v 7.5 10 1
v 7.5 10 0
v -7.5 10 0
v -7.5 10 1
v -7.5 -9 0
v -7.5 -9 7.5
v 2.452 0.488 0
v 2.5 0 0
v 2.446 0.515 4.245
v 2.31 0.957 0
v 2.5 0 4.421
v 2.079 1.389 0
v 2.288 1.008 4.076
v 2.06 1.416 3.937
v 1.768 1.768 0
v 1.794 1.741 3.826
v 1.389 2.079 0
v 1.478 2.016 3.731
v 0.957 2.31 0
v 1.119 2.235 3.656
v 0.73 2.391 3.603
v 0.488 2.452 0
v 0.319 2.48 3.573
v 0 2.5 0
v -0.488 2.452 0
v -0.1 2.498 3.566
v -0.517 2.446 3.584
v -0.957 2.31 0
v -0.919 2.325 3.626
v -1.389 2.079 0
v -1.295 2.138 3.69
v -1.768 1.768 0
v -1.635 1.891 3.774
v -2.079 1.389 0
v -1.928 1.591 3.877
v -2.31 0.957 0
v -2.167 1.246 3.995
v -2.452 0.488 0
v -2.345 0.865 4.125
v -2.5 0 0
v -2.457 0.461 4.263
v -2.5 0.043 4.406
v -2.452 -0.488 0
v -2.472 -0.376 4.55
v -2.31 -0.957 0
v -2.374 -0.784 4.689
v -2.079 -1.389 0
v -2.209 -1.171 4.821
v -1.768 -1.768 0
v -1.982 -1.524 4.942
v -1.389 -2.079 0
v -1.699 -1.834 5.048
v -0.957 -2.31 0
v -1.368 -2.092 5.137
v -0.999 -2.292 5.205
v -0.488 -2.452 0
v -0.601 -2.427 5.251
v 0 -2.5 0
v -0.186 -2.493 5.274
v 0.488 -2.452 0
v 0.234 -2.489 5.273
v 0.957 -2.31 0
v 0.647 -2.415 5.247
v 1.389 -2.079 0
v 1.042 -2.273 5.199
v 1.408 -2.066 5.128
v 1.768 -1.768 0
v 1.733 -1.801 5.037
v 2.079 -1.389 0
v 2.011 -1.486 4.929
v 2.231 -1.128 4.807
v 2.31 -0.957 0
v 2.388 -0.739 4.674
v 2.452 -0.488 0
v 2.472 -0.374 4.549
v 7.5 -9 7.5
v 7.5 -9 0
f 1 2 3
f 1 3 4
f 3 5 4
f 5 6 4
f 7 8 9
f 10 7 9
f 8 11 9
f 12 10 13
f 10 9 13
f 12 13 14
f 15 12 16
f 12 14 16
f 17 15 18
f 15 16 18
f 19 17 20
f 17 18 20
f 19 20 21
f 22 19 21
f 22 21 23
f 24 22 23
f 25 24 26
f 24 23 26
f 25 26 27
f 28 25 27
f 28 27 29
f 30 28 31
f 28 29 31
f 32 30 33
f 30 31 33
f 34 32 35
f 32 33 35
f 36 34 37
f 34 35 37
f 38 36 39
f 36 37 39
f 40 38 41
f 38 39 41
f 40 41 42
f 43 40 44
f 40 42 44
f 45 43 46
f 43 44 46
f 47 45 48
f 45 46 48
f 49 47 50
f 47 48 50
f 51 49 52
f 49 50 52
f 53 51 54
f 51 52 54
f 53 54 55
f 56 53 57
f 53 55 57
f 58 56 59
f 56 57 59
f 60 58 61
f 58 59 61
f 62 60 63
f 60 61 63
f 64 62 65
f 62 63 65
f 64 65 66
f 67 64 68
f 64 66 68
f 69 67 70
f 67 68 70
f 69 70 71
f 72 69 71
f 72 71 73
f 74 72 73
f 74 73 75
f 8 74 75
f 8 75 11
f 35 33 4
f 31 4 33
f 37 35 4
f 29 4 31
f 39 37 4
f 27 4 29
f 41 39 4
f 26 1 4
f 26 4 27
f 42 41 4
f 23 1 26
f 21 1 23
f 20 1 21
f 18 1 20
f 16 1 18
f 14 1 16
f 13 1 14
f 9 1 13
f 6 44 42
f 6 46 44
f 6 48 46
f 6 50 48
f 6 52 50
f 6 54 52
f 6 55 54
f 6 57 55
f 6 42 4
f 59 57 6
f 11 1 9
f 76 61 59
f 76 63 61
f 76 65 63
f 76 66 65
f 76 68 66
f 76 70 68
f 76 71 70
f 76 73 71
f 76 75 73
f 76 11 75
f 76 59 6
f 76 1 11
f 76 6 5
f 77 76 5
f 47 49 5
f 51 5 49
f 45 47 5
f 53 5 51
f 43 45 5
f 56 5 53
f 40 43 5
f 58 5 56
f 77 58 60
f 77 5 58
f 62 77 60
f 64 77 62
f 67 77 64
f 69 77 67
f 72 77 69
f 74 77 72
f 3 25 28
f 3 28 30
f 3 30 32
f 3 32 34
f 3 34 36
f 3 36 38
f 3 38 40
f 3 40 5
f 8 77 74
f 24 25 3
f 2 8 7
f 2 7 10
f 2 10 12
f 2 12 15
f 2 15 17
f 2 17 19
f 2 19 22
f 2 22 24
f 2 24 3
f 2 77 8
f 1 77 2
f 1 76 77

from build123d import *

# Parameters (mm, degrees)
F2_DEPTH = 7.5
F3_DEPTH = 10


with BuildPart() as f2:
    # F1 (on Right) → F2 (new body, symmetric)
    with BuildSketch(Plane.YZ):
        Polygon((-9, 0), (0, 0), (10, 0), (10, 1), (-9, 7.5), align=None)
    extrude(amount=F2_DEPTH, both=True)

    # F0 (on Top) → F3 (cut, symmetric)
    with BuildSketch(Plane.XY):
        with BuildLine():
            ThreePointArc((-2.5, 0), (0, -2.5), (2.5, 0))
            Line((2.5, 0), (-2.5, 0))
        make_face()
        with BuildLine():
            Line((-2.5, 0), (2.5, 0))
            ThreePointArc((2.5, 0), (0, 2.5), (-2.5, 0))
        make_face()
    extrude(amount=F3_DEPTH, both=True, mode=Mode.SUBTRACT)


solid = f2.part
